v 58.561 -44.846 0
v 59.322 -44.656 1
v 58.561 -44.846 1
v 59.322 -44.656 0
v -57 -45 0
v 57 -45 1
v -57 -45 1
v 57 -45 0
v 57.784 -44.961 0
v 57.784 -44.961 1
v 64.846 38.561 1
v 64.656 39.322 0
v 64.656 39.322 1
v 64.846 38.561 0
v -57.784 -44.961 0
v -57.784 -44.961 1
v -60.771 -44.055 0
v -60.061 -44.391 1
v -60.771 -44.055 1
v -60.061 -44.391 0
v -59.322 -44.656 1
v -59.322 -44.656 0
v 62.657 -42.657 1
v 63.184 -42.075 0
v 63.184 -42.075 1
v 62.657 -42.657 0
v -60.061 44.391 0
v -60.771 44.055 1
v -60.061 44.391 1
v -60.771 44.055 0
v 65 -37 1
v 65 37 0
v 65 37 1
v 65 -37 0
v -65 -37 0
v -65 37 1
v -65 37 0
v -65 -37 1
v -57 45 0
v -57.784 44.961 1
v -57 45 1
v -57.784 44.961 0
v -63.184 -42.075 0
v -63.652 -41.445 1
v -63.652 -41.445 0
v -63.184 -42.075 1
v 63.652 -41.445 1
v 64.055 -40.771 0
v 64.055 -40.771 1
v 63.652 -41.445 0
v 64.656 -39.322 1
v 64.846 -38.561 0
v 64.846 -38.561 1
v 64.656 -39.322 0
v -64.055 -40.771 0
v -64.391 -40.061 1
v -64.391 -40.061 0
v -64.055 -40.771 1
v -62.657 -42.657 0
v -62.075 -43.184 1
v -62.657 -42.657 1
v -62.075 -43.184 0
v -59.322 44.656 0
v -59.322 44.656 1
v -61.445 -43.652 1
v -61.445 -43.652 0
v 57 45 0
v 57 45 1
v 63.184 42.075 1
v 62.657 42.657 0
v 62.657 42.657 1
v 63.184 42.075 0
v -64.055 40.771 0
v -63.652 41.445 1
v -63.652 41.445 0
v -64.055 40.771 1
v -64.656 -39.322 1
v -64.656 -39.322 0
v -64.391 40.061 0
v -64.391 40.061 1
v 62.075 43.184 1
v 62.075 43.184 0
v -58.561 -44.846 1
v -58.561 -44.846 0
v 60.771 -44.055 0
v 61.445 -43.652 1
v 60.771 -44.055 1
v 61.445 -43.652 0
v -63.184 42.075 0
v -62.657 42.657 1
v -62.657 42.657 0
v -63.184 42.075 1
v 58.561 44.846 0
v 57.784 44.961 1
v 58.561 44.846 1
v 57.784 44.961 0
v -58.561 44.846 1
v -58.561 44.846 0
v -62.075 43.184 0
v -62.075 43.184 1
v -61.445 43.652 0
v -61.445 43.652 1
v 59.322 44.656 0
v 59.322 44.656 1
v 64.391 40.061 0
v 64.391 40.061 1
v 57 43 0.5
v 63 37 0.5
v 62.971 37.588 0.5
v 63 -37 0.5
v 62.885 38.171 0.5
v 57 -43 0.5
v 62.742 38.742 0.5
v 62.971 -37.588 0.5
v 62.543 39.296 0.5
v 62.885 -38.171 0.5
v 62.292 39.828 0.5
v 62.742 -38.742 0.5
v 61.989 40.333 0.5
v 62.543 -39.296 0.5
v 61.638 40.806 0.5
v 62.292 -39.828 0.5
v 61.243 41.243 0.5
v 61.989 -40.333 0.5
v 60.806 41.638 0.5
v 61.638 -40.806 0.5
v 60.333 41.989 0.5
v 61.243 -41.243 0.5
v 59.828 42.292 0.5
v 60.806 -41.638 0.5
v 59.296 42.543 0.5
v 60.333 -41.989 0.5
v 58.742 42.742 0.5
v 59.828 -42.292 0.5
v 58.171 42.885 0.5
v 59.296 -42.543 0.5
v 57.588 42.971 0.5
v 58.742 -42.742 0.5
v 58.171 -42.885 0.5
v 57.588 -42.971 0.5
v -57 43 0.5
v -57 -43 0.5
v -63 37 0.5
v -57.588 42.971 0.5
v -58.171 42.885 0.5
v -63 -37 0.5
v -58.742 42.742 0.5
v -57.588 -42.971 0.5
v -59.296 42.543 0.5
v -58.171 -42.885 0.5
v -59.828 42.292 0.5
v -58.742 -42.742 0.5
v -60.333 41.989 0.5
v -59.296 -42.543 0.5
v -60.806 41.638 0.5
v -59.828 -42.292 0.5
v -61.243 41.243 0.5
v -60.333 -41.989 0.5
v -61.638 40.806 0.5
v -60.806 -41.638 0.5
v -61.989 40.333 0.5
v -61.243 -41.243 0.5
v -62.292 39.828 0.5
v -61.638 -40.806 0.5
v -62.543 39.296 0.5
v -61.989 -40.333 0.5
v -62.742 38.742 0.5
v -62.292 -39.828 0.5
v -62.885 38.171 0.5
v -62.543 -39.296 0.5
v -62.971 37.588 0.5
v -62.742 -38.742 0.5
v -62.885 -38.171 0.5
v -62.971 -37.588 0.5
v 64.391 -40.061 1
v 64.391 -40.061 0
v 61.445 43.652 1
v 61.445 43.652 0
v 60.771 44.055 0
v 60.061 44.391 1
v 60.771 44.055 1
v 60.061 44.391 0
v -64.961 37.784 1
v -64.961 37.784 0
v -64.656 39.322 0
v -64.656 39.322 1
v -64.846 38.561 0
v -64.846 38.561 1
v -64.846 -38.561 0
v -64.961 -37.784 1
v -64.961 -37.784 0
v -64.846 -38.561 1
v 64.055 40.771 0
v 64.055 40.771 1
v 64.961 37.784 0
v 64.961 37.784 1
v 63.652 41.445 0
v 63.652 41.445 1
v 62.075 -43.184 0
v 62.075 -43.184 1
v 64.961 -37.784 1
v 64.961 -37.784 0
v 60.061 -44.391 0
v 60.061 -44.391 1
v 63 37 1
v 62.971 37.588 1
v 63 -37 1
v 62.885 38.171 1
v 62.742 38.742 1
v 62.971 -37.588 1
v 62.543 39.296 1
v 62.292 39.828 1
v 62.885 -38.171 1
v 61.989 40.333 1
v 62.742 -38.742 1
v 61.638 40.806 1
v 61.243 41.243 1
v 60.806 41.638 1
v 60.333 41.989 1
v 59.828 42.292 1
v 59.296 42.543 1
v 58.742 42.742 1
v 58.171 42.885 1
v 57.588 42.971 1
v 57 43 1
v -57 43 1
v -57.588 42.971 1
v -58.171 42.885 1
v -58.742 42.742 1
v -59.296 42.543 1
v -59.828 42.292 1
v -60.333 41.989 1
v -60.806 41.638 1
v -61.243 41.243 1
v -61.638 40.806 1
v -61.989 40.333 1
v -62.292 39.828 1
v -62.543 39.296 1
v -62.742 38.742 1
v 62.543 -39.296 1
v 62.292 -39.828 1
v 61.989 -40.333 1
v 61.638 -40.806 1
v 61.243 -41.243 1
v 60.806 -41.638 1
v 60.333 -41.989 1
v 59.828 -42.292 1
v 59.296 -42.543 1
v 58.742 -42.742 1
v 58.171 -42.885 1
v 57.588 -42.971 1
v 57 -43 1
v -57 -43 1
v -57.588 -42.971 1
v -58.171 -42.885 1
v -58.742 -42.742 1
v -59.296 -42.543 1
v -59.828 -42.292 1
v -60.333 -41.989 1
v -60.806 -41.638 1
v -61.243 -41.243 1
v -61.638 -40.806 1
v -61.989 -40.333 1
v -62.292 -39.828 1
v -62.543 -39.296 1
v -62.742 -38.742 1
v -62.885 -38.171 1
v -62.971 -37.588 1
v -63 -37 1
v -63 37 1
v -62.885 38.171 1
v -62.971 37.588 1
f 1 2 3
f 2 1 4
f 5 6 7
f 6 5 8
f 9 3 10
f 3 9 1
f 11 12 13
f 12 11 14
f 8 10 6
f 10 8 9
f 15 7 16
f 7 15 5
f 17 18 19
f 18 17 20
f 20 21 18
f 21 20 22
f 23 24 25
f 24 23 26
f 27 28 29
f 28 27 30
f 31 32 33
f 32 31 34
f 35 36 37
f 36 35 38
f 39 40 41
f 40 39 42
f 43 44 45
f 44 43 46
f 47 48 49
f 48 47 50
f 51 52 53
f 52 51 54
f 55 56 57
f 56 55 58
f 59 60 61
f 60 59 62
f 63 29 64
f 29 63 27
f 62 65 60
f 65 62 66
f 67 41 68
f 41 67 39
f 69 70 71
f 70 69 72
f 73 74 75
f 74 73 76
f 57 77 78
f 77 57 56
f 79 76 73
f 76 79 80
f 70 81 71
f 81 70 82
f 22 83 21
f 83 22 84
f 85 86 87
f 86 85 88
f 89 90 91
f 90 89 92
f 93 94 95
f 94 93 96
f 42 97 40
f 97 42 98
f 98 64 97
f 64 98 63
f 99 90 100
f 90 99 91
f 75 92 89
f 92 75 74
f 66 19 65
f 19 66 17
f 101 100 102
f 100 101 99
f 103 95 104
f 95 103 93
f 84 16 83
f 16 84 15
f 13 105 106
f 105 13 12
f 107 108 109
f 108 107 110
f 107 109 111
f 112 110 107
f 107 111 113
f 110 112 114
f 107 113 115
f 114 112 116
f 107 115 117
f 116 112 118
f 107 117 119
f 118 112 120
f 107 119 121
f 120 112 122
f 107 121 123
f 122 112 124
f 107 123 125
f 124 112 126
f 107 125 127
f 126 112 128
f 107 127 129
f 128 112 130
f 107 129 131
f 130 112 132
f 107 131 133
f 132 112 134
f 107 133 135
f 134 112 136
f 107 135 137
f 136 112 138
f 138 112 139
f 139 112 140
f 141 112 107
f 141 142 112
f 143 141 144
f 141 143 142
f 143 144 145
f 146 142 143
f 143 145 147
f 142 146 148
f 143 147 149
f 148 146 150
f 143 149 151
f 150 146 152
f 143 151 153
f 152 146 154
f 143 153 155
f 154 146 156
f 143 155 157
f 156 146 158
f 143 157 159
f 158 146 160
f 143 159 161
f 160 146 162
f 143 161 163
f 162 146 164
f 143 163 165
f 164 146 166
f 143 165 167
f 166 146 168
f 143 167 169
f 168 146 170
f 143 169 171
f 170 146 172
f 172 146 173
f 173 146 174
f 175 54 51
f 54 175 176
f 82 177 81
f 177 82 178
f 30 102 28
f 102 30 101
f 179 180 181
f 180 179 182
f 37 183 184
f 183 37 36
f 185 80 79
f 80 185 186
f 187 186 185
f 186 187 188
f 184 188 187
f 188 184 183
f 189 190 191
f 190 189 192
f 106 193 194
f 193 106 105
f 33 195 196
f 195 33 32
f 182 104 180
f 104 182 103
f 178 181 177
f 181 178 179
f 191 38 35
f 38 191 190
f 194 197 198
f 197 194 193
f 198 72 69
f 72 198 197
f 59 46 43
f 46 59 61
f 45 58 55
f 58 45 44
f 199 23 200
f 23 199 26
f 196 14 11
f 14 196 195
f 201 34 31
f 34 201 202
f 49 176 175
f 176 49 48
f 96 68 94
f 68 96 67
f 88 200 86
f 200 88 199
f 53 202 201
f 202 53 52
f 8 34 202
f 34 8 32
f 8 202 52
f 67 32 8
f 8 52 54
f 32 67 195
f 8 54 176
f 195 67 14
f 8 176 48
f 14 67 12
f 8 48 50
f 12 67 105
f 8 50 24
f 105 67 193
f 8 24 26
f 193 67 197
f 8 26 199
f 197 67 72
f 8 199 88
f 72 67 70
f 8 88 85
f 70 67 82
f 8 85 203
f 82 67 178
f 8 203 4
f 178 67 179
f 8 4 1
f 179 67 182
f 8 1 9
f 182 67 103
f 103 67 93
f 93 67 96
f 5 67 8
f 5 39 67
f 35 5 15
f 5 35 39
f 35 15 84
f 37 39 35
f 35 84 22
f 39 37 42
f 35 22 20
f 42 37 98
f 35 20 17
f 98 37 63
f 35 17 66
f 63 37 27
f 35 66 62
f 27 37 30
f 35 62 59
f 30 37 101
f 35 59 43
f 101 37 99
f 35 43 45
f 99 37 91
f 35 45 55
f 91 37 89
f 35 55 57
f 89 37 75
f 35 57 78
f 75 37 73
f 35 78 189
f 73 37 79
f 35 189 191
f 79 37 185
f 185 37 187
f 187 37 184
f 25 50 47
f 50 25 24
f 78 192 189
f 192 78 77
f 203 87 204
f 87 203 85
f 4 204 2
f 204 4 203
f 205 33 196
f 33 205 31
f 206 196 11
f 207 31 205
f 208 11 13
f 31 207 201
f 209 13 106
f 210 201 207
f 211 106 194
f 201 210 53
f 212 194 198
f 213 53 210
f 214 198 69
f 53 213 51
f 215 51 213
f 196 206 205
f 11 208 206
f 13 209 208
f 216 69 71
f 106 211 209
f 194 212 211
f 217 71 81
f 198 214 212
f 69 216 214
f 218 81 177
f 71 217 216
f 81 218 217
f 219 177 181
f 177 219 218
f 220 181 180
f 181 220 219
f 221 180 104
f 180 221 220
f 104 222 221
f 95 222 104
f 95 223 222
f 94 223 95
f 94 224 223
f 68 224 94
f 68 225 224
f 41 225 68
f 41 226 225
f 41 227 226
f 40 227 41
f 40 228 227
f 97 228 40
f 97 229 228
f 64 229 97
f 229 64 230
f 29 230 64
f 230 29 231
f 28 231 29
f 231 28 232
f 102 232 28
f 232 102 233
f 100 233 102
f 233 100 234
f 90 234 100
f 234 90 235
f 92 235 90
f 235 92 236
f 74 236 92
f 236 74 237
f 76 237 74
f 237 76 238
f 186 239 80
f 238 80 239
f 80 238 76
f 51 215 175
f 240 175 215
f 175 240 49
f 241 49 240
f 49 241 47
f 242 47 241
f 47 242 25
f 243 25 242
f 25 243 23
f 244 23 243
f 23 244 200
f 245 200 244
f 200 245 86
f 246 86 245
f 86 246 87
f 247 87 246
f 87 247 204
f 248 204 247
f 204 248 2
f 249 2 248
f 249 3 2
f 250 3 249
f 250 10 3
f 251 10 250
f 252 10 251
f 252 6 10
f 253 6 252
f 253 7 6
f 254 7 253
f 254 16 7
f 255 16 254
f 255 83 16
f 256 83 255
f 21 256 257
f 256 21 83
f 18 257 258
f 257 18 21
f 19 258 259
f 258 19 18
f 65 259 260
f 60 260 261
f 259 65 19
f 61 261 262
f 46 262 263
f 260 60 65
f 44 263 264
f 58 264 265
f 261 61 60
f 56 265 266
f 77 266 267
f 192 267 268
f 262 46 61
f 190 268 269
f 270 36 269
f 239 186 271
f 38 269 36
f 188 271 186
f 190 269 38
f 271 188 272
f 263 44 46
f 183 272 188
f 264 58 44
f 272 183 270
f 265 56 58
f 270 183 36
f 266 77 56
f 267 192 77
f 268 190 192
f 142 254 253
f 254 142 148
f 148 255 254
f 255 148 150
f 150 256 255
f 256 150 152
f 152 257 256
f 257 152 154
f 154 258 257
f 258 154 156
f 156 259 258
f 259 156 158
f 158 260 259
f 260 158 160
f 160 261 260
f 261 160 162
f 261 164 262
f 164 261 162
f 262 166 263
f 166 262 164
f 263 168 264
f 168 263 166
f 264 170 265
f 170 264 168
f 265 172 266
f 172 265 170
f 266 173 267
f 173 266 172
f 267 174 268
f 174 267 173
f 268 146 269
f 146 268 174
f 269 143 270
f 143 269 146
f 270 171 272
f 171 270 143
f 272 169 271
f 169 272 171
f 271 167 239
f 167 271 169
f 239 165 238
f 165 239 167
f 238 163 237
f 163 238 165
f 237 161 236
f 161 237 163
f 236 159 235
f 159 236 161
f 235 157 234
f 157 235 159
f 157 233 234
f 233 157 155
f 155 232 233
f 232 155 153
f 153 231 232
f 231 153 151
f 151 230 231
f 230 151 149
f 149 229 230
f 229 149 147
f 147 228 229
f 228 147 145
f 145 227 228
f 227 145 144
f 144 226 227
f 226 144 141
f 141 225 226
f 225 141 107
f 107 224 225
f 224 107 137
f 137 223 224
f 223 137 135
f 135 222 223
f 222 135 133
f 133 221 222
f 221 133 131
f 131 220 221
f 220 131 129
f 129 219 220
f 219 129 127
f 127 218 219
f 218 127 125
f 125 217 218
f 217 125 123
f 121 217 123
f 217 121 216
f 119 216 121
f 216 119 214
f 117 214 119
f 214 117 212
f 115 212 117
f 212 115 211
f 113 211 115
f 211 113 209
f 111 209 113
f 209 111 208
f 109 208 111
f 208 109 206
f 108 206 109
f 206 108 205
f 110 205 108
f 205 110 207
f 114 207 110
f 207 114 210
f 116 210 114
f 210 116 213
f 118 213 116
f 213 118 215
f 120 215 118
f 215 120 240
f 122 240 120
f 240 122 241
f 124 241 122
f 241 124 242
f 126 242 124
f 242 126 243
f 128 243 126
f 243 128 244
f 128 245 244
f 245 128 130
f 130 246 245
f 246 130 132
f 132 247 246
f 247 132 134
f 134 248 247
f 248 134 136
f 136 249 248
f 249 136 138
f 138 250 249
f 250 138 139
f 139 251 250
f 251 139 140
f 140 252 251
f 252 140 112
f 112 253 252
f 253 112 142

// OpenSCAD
// 纸箱自取提示牌 - OpenSCAD
// 双层结构：白色底板 1mm + 黑色上层 0.5mm
// 修复圆角边框不等宽问题

// ============================================
// 参数配置
// ============================================

/* [尺寸参数] */
sign_width = 130;       // 牌子宽度 (mm)
sign_height = 90;       // 牌子高度 (mm)
border_width = 2;     // 边框厚度 (mm)
corner_radius = 8;      // 外圆角半径 (mm)
white_base_thickness = 0.5;   // 白色底板厚度 (mm)
black_top_thickness = 0.5;   // 黑色上层厚度 (mm)

/* [颜色] */
frame_color = "black";     // 上层边框/文字颜色（黑色）
base_color = "white";      // 底板颜色（白色）

// ============================================
// 模块定义
// ============================================

module rounded_rect(w, h, r, thickness) {
    linear_extrude(thickness)
        offset(r=r, $fn=64)
            square([w - 2*r, h - 2*r], center=true);
}

// 带不等距偏移的圆角矩形（用于等宽边框）
module rounded_rect_frame(outer_w, outer_h, outer_r, frame_w, thickness) {
    linear_extrude(thickness)
        difference() {
            offset(r=outer_r, $fn=64)
                square([outer_w - 2*outer_r, outer_h - 2*outer_r], center=true);
            // 关键修复：内圈圆角半径 = 外圈半径 - 边框宽度
            offset(r=outer_r - frame_w, $fn=64)
                square([outer_w - 2*outer_r, outer_h - 2*outer_r], center=true);
        }
}

// ============================================
// 模型生成
// ============================================

// 第一层：白色底板
color(base_color)
    rounded_rect(sign_width, sign_height, corner_radius, white_base_thickness);

// 第二层：黑色边框（等宽圆角）
color(frame_color)
    translate([0, 0, white_base_thickness])
        rounded_rect_frame(sign_width, sign_height, corner_radius, border_width, black_top_thickness);
